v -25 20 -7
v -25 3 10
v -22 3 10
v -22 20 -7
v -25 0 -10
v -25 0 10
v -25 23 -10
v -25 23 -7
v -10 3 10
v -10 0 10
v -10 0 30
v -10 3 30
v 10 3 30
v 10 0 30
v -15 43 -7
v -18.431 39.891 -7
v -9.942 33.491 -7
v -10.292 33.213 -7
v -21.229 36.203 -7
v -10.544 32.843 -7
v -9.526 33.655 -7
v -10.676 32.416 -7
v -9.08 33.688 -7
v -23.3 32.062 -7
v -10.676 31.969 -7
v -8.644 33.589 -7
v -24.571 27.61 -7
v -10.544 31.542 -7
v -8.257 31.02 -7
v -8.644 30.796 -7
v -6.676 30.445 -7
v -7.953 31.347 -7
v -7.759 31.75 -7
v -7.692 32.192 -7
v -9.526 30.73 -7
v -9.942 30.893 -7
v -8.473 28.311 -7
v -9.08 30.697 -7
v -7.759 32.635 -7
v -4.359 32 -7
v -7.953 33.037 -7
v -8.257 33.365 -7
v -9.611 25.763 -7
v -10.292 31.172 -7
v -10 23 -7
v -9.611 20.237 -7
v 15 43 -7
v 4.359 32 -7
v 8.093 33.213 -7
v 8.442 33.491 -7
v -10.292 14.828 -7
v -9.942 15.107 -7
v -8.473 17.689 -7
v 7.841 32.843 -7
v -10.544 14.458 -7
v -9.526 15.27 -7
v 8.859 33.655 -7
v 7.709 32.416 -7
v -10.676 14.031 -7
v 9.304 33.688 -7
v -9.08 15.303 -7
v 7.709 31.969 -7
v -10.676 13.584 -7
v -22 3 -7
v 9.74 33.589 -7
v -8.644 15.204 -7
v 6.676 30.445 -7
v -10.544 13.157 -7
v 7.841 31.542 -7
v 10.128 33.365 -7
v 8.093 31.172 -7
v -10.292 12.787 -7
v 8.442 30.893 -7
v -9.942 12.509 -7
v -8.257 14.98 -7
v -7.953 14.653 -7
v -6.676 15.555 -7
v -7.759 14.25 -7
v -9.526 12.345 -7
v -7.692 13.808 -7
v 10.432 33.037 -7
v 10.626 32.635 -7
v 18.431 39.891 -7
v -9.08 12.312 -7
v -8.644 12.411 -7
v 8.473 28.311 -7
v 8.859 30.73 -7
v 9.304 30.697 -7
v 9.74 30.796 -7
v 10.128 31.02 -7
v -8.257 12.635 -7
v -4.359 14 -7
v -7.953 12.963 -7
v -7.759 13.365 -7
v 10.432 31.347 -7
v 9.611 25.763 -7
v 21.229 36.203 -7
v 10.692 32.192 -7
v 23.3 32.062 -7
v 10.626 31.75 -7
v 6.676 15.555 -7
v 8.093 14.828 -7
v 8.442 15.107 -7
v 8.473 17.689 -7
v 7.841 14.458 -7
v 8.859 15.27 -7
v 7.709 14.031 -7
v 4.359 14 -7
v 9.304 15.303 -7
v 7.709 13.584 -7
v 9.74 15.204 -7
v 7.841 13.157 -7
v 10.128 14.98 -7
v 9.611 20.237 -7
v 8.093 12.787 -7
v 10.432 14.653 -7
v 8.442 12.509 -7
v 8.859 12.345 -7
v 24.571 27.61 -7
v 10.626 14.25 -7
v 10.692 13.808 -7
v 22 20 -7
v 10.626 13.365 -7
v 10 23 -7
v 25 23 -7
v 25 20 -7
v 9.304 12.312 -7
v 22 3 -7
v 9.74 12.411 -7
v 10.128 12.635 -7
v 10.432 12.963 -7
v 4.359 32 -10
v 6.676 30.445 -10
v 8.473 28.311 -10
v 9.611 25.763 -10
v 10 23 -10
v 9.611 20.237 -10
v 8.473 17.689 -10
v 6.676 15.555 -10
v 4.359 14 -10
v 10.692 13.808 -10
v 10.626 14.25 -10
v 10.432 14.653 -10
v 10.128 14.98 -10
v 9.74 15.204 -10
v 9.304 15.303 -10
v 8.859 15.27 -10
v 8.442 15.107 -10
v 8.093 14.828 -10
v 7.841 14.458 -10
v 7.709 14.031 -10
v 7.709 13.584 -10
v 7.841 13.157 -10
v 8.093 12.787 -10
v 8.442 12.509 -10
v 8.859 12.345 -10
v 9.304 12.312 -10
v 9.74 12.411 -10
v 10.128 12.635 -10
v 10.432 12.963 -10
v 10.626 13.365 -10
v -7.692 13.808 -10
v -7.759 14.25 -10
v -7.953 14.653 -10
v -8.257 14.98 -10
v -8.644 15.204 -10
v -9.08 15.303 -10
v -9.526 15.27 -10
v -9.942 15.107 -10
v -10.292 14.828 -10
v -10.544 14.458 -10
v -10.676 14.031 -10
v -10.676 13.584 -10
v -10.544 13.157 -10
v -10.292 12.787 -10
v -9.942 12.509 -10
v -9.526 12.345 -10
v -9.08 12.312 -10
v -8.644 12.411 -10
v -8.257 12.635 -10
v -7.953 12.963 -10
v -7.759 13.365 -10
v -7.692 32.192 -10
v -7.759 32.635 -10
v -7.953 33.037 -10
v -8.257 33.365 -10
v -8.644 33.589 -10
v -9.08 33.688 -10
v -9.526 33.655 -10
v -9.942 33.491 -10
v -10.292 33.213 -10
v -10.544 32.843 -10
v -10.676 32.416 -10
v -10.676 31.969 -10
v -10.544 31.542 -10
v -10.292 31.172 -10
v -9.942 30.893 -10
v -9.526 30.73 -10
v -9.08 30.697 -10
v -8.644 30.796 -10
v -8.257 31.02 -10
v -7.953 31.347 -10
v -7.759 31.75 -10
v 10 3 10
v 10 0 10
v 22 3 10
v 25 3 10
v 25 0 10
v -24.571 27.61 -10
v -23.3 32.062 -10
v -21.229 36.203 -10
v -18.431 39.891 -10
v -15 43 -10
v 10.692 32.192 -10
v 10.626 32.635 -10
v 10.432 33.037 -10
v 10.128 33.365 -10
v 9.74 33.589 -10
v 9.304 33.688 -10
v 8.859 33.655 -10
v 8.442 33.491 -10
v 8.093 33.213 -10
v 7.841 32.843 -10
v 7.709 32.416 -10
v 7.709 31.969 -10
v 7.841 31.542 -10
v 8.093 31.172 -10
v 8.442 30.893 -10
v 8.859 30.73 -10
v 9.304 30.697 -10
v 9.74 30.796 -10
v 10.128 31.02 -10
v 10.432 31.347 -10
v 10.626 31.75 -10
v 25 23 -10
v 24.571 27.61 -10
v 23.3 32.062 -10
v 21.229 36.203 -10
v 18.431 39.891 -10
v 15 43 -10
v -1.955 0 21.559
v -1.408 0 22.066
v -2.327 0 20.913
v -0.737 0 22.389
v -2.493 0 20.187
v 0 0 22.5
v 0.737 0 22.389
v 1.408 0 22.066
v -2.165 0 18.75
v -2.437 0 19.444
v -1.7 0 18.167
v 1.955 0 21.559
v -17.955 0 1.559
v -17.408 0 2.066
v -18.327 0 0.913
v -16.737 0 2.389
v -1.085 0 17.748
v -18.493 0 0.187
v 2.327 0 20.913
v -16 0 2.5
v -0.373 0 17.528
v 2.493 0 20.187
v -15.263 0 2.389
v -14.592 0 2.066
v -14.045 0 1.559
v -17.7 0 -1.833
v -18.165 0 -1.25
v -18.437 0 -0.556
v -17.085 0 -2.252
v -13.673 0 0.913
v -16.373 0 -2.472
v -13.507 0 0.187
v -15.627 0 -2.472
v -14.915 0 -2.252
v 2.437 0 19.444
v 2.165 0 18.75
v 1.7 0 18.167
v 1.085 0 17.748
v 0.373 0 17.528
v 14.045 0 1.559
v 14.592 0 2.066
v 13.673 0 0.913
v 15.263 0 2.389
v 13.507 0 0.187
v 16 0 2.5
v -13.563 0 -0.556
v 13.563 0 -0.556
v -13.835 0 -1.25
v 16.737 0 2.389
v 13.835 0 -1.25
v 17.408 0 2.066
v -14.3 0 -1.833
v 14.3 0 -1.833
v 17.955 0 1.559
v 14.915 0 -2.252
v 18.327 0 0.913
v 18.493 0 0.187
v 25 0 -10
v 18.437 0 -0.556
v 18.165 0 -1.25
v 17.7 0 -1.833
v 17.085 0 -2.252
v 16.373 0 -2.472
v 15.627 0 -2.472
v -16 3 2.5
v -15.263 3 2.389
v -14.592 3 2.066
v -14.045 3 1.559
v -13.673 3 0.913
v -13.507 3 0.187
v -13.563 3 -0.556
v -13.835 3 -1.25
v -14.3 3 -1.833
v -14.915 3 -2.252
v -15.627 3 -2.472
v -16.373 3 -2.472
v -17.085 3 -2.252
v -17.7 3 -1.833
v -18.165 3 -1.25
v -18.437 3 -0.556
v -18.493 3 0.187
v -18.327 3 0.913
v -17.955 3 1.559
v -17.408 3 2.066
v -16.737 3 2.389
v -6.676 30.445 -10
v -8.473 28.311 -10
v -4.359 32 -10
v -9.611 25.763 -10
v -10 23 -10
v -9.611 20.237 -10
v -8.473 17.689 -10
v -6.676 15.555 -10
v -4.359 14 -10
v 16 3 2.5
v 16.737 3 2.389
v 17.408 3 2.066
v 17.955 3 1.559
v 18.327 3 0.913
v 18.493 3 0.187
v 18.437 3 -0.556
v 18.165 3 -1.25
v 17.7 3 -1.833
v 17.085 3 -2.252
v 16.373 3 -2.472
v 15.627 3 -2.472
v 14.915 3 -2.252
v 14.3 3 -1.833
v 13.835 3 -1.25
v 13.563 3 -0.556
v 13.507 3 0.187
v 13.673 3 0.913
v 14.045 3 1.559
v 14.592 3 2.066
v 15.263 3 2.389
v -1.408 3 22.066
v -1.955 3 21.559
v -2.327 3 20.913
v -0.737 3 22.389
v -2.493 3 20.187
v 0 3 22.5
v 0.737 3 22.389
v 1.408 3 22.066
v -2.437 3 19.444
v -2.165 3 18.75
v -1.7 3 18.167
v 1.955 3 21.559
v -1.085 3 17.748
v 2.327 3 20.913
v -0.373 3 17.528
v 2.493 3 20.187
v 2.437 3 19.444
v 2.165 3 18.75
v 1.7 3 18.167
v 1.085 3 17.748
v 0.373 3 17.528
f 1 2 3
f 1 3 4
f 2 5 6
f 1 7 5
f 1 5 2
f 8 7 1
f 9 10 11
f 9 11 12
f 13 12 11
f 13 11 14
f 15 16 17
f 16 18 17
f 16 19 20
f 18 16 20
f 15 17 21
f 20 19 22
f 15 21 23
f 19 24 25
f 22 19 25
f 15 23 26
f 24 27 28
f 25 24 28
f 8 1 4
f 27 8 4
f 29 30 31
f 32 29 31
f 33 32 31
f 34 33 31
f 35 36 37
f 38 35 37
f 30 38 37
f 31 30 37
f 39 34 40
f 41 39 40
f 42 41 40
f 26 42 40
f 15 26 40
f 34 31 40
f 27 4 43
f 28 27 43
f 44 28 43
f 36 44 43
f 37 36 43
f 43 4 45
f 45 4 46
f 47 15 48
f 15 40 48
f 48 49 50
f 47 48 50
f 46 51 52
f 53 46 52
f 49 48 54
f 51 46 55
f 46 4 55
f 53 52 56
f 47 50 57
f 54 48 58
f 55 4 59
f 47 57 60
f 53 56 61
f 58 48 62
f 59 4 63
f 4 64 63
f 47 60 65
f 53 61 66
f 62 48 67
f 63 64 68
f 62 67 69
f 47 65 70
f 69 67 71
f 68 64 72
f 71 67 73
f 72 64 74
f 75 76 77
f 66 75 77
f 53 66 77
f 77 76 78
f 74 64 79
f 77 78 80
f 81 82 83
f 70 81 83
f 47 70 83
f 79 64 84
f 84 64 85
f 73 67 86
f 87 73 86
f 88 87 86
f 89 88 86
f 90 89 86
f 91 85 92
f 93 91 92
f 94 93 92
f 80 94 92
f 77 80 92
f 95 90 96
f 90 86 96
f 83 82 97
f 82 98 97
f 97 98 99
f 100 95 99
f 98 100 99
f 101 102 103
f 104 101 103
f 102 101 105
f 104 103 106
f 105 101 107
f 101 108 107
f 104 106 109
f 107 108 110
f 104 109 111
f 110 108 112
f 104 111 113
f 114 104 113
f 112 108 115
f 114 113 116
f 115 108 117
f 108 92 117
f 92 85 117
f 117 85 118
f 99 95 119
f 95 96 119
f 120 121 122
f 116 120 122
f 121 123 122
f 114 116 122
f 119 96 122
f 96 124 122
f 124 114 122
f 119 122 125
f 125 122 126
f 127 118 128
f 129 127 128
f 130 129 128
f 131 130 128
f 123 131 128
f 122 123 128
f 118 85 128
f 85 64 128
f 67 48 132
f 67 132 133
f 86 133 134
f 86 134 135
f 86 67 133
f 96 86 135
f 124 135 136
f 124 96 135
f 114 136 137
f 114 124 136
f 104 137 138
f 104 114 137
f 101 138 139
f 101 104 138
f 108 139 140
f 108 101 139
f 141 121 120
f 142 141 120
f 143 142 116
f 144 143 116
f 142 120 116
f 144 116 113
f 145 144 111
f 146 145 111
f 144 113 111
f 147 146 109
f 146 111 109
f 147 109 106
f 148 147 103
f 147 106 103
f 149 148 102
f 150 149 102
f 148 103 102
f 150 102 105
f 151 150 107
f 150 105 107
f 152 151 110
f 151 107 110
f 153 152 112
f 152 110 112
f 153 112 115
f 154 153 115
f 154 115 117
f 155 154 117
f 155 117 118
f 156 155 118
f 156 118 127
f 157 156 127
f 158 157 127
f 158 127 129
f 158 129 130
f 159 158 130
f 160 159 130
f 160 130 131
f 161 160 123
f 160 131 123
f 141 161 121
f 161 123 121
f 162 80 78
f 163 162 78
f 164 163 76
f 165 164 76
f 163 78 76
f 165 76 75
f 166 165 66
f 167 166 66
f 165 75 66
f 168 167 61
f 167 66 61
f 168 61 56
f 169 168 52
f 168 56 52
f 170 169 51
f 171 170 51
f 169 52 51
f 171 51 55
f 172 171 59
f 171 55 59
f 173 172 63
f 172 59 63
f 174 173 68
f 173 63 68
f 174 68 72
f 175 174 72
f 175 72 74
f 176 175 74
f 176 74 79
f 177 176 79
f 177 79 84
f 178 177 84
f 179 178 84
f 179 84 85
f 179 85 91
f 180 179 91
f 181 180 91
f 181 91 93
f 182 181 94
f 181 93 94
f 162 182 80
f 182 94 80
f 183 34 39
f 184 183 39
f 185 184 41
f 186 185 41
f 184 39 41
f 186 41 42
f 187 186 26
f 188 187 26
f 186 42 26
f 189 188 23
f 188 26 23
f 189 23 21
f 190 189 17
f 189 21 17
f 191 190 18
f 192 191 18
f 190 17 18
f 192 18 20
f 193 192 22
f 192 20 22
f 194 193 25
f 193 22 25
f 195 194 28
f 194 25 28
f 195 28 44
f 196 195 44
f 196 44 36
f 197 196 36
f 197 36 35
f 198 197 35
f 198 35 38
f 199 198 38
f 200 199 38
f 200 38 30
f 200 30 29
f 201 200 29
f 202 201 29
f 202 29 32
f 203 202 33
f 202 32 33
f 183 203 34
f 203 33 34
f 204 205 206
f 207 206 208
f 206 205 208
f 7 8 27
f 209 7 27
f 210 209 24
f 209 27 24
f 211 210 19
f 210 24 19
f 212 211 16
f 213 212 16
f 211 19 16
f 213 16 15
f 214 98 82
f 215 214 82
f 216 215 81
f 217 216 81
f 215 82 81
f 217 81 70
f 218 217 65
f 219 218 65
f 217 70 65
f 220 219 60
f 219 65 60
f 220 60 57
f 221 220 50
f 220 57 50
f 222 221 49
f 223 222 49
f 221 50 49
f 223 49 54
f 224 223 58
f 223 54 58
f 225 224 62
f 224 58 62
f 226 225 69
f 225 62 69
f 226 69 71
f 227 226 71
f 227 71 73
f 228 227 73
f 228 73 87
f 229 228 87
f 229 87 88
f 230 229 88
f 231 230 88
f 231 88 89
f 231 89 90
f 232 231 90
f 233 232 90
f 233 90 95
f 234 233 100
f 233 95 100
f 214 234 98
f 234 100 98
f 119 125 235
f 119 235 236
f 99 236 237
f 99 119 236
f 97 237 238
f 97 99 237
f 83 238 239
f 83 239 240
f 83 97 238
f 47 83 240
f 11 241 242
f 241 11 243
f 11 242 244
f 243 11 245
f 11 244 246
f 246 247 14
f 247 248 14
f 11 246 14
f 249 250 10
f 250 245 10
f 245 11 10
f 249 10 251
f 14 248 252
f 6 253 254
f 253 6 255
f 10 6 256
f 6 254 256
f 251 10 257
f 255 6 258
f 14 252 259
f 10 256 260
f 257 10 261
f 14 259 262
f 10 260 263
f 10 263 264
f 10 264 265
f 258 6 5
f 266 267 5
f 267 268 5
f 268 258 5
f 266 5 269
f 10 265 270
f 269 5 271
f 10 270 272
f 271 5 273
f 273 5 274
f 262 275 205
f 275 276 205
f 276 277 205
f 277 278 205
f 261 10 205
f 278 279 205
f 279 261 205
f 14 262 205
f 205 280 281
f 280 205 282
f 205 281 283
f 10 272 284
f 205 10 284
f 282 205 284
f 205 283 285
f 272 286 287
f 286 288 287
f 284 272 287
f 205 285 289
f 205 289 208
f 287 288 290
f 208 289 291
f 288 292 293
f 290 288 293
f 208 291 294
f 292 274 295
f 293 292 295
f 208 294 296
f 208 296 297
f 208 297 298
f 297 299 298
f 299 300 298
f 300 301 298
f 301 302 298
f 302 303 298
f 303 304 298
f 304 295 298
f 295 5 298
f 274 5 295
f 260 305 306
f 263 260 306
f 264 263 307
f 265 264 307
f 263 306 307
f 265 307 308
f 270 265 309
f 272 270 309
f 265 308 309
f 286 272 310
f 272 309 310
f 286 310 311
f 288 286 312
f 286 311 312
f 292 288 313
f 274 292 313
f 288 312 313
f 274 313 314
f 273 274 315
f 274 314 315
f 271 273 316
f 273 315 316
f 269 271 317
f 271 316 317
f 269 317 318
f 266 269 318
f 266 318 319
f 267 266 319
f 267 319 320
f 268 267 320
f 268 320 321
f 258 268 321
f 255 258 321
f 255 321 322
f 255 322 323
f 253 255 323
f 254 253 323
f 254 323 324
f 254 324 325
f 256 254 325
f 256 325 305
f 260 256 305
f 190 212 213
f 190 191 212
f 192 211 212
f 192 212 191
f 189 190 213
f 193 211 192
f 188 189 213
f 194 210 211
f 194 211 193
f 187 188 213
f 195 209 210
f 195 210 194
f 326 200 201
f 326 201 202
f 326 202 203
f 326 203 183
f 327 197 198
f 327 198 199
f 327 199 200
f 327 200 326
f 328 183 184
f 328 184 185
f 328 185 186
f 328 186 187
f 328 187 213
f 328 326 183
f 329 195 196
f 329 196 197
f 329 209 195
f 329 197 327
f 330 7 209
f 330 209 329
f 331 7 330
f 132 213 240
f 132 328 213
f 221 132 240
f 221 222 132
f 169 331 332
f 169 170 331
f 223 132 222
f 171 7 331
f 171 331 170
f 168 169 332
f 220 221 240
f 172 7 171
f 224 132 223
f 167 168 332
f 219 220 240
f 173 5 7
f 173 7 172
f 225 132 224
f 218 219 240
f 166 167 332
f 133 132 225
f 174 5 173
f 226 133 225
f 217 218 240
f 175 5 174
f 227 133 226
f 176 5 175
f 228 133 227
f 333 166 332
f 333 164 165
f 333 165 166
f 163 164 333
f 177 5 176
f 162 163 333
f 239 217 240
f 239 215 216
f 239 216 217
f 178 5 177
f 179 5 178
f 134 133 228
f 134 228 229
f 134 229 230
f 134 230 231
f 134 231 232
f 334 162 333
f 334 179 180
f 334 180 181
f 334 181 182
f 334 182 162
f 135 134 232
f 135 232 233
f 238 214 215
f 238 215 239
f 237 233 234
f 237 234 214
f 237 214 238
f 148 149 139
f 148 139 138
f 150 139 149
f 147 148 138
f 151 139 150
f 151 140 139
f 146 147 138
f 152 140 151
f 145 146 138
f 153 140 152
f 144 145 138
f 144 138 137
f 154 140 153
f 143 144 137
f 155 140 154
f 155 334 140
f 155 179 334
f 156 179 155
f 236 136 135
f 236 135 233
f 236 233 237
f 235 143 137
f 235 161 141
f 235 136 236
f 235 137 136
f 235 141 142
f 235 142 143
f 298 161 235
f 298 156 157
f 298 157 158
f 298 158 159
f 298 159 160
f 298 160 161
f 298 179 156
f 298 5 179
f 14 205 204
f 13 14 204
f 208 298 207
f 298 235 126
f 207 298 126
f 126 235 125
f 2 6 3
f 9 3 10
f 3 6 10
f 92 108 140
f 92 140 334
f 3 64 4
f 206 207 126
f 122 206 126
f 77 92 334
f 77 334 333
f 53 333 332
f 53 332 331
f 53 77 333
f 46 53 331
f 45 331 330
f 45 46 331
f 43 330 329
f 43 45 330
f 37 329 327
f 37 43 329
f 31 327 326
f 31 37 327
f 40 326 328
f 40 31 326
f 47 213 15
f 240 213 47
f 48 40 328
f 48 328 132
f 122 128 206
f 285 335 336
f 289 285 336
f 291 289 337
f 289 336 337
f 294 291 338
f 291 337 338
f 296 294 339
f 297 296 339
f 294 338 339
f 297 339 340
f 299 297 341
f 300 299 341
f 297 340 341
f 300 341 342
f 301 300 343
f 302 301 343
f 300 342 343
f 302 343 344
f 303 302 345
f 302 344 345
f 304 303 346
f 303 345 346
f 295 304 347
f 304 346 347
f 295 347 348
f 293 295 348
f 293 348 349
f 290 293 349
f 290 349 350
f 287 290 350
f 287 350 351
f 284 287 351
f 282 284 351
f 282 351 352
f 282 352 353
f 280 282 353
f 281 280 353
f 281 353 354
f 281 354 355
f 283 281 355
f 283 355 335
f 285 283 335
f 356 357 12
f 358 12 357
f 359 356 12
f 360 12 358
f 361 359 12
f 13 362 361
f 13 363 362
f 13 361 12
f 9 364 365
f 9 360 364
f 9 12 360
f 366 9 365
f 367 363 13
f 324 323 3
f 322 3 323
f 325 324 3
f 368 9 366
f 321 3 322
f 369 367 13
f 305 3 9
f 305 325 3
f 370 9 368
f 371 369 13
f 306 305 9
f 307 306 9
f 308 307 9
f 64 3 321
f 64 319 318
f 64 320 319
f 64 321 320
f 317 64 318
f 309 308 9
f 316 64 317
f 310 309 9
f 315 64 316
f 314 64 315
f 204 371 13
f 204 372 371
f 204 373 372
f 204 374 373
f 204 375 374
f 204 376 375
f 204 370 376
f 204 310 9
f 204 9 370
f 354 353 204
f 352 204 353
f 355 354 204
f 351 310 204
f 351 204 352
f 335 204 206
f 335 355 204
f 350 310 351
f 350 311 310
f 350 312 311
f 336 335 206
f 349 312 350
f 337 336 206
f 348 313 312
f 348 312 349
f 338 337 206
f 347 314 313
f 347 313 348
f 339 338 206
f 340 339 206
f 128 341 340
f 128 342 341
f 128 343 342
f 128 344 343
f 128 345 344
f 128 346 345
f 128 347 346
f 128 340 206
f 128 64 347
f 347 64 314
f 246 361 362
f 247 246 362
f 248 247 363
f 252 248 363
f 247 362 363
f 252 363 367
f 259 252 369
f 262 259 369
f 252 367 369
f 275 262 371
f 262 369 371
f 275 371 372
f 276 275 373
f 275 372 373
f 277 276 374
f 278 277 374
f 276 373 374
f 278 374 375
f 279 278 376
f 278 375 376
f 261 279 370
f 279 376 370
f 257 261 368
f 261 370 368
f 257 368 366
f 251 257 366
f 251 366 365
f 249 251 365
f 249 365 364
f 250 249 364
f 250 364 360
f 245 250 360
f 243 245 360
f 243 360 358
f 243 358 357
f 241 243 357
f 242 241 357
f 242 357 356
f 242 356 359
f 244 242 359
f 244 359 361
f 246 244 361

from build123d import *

# Parameters (mm, degrees)
SKETCH1_W           = 50
SKETCH1_H           = 20
BOSS_EXTRUDE1_DEPTH = 3
SKETCH2_W           = 50
SKETCH2_H           = 3
BOSS_EXTRUDE2_DEPTH = 40
CUT_EXTRUDE4_REACH  = 50.218
SKETCH6_R           = 2.5
BOSS_EXTRUDE3_DEPTH = 3
BOSS_EXTRUDE4_DEPTH = 3
SKETCH9_W           = 20
SKETCH9_H           = 3
BOSS_EXTRUDE5_DEPTH = 20
CUT_EXTRUDE5_REACH  = 57.902
SKETCH10_R          = 2.5
SKETCH11_R          = 1.5
CUT_EXTRUDE6_DEPTH  = 3


with BuildPart() as part:
    # Sketch1 → Boss-Extrude1 (new body)
    with BuildSketch(Plane(origin=(0, 0, 0), x_dir=(1, 0, 0), z_dir=(0, 1, 0))):
        Rectangle(SKETCH1_W, SKETCH1_H)
    extrude(amount=BOSS_EXTRUDE1_DEPTH)

    # Sketch2 → Boss-Extrude2 (add)
    with BuildSketch(Plane(origin=(0, 3, 0), x_dir=(1, 0, 0), z_dir=(0, 1, 0))):
        with Locations((0, 8.5)):
            Rectangle(SKETCH2_W, SKETCH2_H)
    extrude(amount=BOSS_EXTRUDE2_DEPTH)

    # Sketch6 → Cut-Extrude4 (cut, up to next)
    with BuildSketch(Plane(origin=(0, 3, 0), x_dir=(1, 0, 0), z_dir=(0, 1, 0)), mode=Mode.PRIVATE) as cut_extrude4_sk1:
        with Locations(Location((-16, 0, 0), (0, 0, 270))):
            Circle(SKETCH6_R)
    cut_extrude4_tool1 = extrude(cut_extrude4_sk1.sketch, amount=-CUT_EXTRUDE4_REACH, mode=Mode.PRIVATE) & part.part
    # Sketch6 → Cut-Extrude4 (cut, up to next)
    with BuildSketch(Plane(origin=(0, 3, 0), x_dir=(1, 0, 0), z_dir=(0, 1, 0)), mode=Mode.PRIVATE) as cut_extrude4_sk2:
        with Locations(Location((16, 0, 0), (0, 0, 270))):
            Circle(SKETCH6_R)
    cut_extrude4_tool2 = extrude(cut_extrude4_sk2.sketch, amount=-CUT_EXTRUDE4_REACH, mode=Mode.PRIVATE) & part.part
    add(cut_extrude4_tool1.solids().sort_by_distance((-16, 3, 0))[0], mode=Mode.SUBTRACT)
    add(cut_extrude4_tool2.solids().sort_by_distance((16, 3, 0))[0], mode=Mode.SUBTRACT)

    # Sketch7 → Boss-Extrude3 (add)
    with BuildSketch(Plane.ZY.offset(25)):
        Polygon((-7, 3), (10, 3), (-7, 20), align=None)
    extrude(amount=-BOSS_EXTRUDE3_DEPTH)

    # Sketch8 → Boss-Extrude4 (add)
    with BuildSketch(Plane(origin=(25, 0, 0), x_dir=(0, 0, -1), z_dir=(1, 0, 0))):
        Polygon((7, 3), (-10, 3), (7, 20), align=None)
    extrude(amount=-BOSS_EXTRUDE4_DEPTH)

    # Sketch9 → Boss-Extrude5 (add)
    with BuildSketch(Plane.XY.offset(10)):
        with Locations((0, 1.5)):
            Rectangle(SKETCH9_W, SKETCH9_H)
    extrude(amount=BOSS_EXTRUDE5_DEPTH)

    # Sketch10 → Cut-Extrude5 (cut, up to next)
    with BuildSketch(Plane(origin=(0, 3, 0), x_dir=(1, 0, 0), z_dir=(0, 1, 0)), mode=Mode.PRIVATE) as cut_extrude5_sk1:
        with Locations(Location((0, -20, 0), (0, 0, 270))):
            Circle(SKETCH10_R)
    cut_extrude5_tool1 = extrude(cut_extrude5_sk1.sketch, amount=-CUT_EXTRUDE5_REACH, mode=Mode.PRIVATE) & part.part
    add(cut_extrude5_tool1.solids().sort_by_distance((0, 3, 20))[0], mode=Mode.SUBTRACT)

    # Sketch11 → Cut-Extrude6 (cut)
    with BuildSketch(Plane.XY.offset(-7)):
        with Locations((9.192388155, 32.192388155)):
            Circle(SKETCH11_R)
        with Locations((9.192388155, 13.807611845)):
            Circle(SKETCH11_R)
        with Locations((-9.192388155, 13.807611845)):
            Circle(SKETCH11_R)
        with Locations((-9.192388155, 32.192388155)):
            Circle(SKETCH11_R)
        with BuildLine():
            Line((15, 43), (25, 43))
            Line((25, 43), (25, 23))
            ThreePointArc((25, 23), (22.360679775, 34.180339887), (15, 43))
        make_face()
        with BuildLine():
            Line((-15, 43), (-25, 43))
            Line((-25, 43), (-25, 23))
            ThreePointArc((-25, 23), (-22.360679775, 34.180339887), (-15, 43))
        make_face()
        with BuildLine():
            Line((-4.358898944, 32), (4.358898944, 32))
            ThreePointArc((4.358898944, 32), (10, 23), (4.358898944, 14))
            Line((4.358898944, 14), (-4.358898944, 14))
            ThreePointArc((-4.358898944, 14), (-10, 23), (-4.358898944, 32))
        make_face()
    extrude(amount=-CUT_EXTRUDE6_DEPTH, mode=Mode.SUBTRACT)


solid = part.part
